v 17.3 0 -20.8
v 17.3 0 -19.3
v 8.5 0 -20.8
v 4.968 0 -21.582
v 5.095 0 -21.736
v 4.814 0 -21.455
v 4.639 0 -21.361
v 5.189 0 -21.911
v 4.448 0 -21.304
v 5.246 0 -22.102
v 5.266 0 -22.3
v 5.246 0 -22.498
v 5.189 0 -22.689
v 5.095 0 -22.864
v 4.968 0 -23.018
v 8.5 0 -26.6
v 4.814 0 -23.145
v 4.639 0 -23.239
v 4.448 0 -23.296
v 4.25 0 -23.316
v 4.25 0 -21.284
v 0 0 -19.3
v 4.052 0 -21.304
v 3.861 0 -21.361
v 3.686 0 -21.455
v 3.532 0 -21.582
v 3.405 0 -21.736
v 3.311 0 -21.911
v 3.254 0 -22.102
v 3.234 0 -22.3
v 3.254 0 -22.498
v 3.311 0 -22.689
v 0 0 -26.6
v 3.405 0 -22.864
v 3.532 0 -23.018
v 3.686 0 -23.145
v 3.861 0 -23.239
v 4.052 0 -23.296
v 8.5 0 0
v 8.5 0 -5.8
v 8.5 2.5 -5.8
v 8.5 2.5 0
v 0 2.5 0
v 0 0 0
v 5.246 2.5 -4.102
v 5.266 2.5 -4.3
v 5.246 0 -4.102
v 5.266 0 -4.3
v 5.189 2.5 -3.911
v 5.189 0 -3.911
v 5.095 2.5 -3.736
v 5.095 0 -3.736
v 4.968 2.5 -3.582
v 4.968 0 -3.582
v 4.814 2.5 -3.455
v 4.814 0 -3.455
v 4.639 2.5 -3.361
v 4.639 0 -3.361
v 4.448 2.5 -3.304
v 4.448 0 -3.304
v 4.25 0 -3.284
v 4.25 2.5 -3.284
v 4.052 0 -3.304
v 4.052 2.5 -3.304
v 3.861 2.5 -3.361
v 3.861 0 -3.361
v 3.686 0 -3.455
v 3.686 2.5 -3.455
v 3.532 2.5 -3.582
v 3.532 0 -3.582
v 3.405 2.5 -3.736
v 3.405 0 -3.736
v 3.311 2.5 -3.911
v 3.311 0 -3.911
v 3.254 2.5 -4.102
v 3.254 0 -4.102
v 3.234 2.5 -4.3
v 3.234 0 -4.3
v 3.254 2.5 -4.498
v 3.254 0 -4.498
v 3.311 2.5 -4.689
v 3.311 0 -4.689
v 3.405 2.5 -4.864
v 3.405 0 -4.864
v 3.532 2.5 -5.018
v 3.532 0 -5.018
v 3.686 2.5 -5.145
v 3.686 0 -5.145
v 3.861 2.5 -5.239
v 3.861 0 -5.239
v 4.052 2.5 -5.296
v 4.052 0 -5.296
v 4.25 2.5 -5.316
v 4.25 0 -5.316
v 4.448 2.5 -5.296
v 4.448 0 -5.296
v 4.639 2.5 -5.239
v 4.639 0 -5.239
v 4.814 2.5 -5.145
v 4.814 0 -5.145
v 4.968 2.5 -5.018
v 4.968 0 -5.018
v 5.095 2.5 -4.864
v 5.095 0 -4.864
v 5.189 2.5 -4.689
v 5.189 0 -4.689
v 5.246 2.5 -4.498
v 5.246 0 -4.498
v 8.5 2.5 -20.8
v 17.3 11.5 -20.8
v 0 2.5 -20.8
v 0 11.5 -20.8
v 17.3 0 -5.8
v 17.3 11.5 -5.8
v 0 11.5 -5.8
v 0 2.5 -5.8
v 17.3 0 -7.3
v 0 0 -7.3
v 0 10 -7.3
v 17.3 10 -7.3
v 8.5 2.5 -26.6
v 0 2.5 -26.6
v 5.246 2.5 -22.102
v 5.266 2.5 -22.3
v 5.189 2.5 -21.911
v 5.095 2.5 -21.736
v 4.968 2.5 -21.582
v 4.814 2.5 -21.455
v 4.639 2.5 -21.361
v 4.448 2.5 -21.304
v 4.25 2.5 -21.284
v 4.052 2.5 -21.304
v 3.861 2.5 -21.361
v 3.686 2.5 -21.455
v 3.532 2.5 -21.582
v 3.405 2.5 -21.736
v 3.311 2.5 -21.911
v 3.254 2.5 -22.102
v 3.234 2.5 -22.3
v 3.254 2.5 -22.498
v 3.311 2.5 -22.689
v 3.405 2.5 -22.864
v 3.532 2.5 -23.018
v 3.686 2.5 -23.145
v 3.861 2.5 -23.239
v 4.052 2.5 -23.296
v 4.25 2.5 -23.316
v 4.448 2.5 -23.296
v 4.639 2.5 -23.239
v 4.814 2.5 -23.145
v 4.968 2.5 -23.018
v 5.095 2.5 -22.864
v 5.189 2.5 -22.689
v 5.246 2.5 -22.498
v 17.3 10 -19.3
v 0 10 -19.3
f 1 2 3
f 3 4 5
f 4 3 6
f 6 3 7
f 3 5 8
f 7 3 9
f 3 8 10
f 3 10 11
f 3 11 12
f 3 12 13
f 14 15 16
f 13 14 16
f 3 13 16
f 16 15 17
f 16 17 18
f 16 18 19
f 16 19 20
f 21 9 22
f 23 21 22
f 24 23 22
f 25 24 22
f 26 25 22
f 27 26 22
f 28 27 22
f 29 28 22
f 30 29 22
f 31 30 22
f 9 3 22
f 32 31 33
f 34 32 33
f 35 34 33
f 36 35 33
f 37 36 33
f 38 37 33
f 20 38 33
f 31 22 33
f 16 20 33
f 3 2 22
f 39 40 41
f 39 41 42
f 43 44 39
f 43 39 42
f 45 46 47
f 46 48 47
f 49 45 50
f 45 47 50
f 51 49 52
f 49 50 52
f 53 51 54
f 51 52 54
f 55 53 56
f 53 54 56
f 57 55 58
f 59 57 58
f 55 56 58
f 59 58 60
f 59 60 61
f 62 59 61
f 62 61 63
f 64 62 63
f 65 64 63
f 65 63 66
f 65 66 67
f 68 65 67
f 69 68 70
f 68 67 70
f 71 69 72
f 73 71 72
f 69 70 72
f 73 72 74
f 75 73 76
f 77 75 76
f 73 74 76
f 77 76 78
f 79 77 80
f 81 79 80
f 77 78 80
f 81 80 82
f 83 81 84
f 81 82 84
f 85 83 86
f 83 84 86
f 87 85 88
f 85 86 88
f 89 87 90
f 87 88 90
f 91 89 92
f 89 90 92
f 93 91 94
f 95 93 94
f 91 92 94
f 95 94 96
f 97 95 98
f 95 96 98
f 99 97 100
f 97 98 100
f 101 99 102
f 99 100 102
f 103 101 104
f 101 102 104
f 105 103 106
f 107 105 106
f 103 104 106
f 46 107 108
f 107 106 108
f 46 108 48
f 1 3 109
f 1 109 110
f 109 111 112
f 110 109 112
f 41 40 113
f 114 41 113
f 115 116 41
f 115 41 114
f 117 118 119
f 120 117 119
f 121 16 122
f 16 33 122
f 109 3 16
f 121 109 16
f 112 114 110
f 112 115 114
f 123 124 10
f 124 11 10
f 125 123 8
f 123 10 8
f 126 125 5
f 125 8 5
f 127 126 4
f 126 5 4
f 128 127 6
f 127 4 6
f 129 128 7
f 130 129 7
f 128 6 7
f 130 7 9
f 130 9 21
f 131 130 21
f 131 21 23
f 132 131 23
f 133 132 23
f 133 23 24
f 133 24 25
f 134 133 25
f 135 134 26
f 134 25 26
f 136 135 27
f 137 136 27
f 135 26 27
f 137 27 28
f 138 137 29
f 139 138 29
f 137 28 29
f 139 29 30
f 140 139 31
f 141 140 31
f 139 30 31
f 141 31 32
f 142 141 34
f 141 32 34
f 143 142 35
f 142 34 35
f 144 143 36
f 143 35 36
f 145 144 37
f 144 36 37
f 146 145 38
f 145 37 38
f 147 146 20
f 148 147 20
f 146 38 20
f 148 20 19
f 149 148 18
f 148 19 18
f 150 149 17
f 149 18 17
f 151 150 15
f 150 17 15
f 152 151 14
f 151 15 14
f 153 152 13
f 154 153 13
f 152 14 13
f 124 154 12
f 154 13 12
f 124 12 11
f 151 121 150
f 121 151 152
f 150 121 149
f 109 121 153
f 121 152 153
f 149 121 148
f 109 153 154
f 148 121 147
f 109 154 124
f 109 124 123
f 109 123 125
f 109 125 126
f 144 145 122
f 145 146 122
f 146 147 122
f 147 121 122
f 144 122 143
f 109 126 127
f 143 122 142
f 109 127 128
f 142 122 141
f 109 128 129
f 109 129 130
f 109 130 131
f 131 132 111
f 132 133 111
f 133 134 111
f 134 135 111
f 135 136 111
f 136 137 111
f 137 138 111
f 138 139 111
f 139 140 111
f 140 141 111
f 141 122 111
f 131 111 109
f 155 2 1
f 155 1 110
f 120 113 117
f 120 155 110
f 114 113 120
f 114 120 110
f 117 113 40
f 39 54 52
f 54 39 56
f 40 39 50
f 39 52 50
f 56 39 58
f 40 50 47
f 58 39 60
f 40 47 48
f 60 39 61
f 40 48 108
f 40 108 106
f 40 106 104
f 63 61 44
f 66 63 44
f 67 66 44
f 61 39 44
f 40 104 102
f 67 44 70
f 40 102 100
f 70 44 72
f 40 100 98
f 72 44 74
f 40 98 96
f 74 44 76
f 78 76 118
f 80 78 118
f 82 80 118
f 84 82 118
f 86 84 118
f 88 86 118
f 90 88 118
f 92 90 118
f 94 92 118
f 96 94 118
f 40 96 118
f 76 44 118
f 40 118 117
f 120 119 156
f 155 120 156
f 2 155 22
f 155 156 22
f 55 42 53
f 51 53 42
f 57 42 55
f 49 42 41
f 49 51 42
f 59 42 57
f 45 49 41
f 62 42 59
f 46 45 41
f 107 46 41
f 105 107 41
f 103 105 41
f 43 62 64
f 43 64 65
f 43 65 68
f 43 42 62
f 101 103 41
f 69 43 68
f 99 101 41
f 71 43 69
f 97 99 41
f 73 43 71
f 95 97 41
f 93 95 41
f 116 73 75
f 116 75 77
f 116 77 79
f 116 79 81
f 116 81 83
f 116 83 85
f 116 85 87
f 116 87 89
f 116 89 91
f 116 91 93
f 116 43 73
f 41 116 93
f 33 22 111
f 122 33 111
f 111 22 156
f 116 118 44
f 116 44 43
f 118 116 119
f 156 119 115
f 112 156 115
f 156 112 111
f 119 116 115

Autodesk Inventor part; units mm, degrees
ref_plane "YZ Plane" through (0, 0, 0) normal (1, 0, 0) x (0, 1, 0)
ref_plane "XZ Plane" through (0, 0, 0) normal (0, 1, 0) x (-1, 0, 0)
ref_plane "XY Plane" through (0, 0, 0) normal (0, 0, 1) x (1, 0, 0)
sketch "Sketch3" plane through (0, 0, 0) normal (1, 0, 0) x (0, 1, 0)
  line L0 (0, 0) -> (0, -7.3)
  line L1 (0, 0) -> (2.5, 0)
  line L2 (2.5, 0) -> (2.5, -5.8)
  line L3 (2.5, -5.8) -> (11.5, -5.8)
  line L4 (0, -13.3) -> (11.5, -13.3) construction
  line L5 (0, -26.6) -> (2.5, -26.6)
  line L6 (2.5, -26.6) -> (2.5, -20.8)
  line L7 (2.5, -20.8) -> (11.5, -20.8)
  line L8 (11.5, -5.8) -> (11.5, -20.8)
  line L9 (0, -7.3) -> (10, -7.3)
  line L10 (10, -7.3) -> (10, -19.3)
  line L11 (10, -19.3) -> (0, -19.3)
  line L12 (0, -19.3) -> (0, -26.6)
  dimension "d10" = 26.6
  dimension "d12" = 2.5
  dimension "d13" = 5.8
  dimension "d14" = 11.5
  dimension "d15" = 1.5
  dimension "d16" = 1.5
  dimension "d17" = 1.5
extrude "Extrusion1" add sketch "Sketch3" along normal blind 17.3
sketch "Sketch5" plane through (0, 0, -26.6) normal (0, -1, 0) x (1, 0, 0)
  line L0 (0, 0) -> (8.5, 0) construction
  line L1 (8.5, 0) -> (8.5, 5.8) construction
  line L2 (8.5, 5.8) -> (0, 5.8) construction
  line L3 (0, 5.8) -> (0, 0) construction
  line L4 (8.5, 0) -> (17.3, 0)
  line L5 (17.3, 0) -> (17.3, 5.8)
  line L6 (17.3, 5.8) -> (8.5, 5.8)
  line L7 (8.5, 5.8) -> (8.5, 0)
  line L8 (0, 19.3) -> (0, 7.3) projected
  line L9 (0, 13.3) -> (17.3, 13.3) construction
  line L10 (8.5, 26.6) -> (8.5, 20.8) construction
  line L11 (8.5, 26.6) -> (17.3, 26.6)
  line L12 (17.3, 26.6) -> (17.3, 20.8)
  line L13 (17.3, 20.8) -> (8.5, 20.8)
  line L14 (8.5, 20.8) -> (8.5, 26.6)
  point P0 (0, 26.6)
  dimension "d22" = 5.8
  dimension "d23" = 8.5
extrude "Extrusion2" cut sketch "Sketch5" against normal through all
sketch "Sketch6" plane through (0, 0, -7.3) normal (0, -1, 0) x (1, 0, 0)
  circle A0 centre (4.25, 3) radius 1.016
  line L0 (0, 7.3) -> (0, 0) projected
  line L1 (0, 0) -> (0, -12) projected
  line L2 (0, -6) -> (17.3, -6) construction
  line L3 (17.3, -13.5) -> (17.3, 1.5) projected
  circle A1 centre (4.25, -15) radius 1.016
  dimension "d26" = 2.032
  dimension "d27" = 4.25
  dimension "d28" = 18
extrude "Extrusion3" cut sketch "Sketch6" against normal through all
properties part number "gear_bracket"
